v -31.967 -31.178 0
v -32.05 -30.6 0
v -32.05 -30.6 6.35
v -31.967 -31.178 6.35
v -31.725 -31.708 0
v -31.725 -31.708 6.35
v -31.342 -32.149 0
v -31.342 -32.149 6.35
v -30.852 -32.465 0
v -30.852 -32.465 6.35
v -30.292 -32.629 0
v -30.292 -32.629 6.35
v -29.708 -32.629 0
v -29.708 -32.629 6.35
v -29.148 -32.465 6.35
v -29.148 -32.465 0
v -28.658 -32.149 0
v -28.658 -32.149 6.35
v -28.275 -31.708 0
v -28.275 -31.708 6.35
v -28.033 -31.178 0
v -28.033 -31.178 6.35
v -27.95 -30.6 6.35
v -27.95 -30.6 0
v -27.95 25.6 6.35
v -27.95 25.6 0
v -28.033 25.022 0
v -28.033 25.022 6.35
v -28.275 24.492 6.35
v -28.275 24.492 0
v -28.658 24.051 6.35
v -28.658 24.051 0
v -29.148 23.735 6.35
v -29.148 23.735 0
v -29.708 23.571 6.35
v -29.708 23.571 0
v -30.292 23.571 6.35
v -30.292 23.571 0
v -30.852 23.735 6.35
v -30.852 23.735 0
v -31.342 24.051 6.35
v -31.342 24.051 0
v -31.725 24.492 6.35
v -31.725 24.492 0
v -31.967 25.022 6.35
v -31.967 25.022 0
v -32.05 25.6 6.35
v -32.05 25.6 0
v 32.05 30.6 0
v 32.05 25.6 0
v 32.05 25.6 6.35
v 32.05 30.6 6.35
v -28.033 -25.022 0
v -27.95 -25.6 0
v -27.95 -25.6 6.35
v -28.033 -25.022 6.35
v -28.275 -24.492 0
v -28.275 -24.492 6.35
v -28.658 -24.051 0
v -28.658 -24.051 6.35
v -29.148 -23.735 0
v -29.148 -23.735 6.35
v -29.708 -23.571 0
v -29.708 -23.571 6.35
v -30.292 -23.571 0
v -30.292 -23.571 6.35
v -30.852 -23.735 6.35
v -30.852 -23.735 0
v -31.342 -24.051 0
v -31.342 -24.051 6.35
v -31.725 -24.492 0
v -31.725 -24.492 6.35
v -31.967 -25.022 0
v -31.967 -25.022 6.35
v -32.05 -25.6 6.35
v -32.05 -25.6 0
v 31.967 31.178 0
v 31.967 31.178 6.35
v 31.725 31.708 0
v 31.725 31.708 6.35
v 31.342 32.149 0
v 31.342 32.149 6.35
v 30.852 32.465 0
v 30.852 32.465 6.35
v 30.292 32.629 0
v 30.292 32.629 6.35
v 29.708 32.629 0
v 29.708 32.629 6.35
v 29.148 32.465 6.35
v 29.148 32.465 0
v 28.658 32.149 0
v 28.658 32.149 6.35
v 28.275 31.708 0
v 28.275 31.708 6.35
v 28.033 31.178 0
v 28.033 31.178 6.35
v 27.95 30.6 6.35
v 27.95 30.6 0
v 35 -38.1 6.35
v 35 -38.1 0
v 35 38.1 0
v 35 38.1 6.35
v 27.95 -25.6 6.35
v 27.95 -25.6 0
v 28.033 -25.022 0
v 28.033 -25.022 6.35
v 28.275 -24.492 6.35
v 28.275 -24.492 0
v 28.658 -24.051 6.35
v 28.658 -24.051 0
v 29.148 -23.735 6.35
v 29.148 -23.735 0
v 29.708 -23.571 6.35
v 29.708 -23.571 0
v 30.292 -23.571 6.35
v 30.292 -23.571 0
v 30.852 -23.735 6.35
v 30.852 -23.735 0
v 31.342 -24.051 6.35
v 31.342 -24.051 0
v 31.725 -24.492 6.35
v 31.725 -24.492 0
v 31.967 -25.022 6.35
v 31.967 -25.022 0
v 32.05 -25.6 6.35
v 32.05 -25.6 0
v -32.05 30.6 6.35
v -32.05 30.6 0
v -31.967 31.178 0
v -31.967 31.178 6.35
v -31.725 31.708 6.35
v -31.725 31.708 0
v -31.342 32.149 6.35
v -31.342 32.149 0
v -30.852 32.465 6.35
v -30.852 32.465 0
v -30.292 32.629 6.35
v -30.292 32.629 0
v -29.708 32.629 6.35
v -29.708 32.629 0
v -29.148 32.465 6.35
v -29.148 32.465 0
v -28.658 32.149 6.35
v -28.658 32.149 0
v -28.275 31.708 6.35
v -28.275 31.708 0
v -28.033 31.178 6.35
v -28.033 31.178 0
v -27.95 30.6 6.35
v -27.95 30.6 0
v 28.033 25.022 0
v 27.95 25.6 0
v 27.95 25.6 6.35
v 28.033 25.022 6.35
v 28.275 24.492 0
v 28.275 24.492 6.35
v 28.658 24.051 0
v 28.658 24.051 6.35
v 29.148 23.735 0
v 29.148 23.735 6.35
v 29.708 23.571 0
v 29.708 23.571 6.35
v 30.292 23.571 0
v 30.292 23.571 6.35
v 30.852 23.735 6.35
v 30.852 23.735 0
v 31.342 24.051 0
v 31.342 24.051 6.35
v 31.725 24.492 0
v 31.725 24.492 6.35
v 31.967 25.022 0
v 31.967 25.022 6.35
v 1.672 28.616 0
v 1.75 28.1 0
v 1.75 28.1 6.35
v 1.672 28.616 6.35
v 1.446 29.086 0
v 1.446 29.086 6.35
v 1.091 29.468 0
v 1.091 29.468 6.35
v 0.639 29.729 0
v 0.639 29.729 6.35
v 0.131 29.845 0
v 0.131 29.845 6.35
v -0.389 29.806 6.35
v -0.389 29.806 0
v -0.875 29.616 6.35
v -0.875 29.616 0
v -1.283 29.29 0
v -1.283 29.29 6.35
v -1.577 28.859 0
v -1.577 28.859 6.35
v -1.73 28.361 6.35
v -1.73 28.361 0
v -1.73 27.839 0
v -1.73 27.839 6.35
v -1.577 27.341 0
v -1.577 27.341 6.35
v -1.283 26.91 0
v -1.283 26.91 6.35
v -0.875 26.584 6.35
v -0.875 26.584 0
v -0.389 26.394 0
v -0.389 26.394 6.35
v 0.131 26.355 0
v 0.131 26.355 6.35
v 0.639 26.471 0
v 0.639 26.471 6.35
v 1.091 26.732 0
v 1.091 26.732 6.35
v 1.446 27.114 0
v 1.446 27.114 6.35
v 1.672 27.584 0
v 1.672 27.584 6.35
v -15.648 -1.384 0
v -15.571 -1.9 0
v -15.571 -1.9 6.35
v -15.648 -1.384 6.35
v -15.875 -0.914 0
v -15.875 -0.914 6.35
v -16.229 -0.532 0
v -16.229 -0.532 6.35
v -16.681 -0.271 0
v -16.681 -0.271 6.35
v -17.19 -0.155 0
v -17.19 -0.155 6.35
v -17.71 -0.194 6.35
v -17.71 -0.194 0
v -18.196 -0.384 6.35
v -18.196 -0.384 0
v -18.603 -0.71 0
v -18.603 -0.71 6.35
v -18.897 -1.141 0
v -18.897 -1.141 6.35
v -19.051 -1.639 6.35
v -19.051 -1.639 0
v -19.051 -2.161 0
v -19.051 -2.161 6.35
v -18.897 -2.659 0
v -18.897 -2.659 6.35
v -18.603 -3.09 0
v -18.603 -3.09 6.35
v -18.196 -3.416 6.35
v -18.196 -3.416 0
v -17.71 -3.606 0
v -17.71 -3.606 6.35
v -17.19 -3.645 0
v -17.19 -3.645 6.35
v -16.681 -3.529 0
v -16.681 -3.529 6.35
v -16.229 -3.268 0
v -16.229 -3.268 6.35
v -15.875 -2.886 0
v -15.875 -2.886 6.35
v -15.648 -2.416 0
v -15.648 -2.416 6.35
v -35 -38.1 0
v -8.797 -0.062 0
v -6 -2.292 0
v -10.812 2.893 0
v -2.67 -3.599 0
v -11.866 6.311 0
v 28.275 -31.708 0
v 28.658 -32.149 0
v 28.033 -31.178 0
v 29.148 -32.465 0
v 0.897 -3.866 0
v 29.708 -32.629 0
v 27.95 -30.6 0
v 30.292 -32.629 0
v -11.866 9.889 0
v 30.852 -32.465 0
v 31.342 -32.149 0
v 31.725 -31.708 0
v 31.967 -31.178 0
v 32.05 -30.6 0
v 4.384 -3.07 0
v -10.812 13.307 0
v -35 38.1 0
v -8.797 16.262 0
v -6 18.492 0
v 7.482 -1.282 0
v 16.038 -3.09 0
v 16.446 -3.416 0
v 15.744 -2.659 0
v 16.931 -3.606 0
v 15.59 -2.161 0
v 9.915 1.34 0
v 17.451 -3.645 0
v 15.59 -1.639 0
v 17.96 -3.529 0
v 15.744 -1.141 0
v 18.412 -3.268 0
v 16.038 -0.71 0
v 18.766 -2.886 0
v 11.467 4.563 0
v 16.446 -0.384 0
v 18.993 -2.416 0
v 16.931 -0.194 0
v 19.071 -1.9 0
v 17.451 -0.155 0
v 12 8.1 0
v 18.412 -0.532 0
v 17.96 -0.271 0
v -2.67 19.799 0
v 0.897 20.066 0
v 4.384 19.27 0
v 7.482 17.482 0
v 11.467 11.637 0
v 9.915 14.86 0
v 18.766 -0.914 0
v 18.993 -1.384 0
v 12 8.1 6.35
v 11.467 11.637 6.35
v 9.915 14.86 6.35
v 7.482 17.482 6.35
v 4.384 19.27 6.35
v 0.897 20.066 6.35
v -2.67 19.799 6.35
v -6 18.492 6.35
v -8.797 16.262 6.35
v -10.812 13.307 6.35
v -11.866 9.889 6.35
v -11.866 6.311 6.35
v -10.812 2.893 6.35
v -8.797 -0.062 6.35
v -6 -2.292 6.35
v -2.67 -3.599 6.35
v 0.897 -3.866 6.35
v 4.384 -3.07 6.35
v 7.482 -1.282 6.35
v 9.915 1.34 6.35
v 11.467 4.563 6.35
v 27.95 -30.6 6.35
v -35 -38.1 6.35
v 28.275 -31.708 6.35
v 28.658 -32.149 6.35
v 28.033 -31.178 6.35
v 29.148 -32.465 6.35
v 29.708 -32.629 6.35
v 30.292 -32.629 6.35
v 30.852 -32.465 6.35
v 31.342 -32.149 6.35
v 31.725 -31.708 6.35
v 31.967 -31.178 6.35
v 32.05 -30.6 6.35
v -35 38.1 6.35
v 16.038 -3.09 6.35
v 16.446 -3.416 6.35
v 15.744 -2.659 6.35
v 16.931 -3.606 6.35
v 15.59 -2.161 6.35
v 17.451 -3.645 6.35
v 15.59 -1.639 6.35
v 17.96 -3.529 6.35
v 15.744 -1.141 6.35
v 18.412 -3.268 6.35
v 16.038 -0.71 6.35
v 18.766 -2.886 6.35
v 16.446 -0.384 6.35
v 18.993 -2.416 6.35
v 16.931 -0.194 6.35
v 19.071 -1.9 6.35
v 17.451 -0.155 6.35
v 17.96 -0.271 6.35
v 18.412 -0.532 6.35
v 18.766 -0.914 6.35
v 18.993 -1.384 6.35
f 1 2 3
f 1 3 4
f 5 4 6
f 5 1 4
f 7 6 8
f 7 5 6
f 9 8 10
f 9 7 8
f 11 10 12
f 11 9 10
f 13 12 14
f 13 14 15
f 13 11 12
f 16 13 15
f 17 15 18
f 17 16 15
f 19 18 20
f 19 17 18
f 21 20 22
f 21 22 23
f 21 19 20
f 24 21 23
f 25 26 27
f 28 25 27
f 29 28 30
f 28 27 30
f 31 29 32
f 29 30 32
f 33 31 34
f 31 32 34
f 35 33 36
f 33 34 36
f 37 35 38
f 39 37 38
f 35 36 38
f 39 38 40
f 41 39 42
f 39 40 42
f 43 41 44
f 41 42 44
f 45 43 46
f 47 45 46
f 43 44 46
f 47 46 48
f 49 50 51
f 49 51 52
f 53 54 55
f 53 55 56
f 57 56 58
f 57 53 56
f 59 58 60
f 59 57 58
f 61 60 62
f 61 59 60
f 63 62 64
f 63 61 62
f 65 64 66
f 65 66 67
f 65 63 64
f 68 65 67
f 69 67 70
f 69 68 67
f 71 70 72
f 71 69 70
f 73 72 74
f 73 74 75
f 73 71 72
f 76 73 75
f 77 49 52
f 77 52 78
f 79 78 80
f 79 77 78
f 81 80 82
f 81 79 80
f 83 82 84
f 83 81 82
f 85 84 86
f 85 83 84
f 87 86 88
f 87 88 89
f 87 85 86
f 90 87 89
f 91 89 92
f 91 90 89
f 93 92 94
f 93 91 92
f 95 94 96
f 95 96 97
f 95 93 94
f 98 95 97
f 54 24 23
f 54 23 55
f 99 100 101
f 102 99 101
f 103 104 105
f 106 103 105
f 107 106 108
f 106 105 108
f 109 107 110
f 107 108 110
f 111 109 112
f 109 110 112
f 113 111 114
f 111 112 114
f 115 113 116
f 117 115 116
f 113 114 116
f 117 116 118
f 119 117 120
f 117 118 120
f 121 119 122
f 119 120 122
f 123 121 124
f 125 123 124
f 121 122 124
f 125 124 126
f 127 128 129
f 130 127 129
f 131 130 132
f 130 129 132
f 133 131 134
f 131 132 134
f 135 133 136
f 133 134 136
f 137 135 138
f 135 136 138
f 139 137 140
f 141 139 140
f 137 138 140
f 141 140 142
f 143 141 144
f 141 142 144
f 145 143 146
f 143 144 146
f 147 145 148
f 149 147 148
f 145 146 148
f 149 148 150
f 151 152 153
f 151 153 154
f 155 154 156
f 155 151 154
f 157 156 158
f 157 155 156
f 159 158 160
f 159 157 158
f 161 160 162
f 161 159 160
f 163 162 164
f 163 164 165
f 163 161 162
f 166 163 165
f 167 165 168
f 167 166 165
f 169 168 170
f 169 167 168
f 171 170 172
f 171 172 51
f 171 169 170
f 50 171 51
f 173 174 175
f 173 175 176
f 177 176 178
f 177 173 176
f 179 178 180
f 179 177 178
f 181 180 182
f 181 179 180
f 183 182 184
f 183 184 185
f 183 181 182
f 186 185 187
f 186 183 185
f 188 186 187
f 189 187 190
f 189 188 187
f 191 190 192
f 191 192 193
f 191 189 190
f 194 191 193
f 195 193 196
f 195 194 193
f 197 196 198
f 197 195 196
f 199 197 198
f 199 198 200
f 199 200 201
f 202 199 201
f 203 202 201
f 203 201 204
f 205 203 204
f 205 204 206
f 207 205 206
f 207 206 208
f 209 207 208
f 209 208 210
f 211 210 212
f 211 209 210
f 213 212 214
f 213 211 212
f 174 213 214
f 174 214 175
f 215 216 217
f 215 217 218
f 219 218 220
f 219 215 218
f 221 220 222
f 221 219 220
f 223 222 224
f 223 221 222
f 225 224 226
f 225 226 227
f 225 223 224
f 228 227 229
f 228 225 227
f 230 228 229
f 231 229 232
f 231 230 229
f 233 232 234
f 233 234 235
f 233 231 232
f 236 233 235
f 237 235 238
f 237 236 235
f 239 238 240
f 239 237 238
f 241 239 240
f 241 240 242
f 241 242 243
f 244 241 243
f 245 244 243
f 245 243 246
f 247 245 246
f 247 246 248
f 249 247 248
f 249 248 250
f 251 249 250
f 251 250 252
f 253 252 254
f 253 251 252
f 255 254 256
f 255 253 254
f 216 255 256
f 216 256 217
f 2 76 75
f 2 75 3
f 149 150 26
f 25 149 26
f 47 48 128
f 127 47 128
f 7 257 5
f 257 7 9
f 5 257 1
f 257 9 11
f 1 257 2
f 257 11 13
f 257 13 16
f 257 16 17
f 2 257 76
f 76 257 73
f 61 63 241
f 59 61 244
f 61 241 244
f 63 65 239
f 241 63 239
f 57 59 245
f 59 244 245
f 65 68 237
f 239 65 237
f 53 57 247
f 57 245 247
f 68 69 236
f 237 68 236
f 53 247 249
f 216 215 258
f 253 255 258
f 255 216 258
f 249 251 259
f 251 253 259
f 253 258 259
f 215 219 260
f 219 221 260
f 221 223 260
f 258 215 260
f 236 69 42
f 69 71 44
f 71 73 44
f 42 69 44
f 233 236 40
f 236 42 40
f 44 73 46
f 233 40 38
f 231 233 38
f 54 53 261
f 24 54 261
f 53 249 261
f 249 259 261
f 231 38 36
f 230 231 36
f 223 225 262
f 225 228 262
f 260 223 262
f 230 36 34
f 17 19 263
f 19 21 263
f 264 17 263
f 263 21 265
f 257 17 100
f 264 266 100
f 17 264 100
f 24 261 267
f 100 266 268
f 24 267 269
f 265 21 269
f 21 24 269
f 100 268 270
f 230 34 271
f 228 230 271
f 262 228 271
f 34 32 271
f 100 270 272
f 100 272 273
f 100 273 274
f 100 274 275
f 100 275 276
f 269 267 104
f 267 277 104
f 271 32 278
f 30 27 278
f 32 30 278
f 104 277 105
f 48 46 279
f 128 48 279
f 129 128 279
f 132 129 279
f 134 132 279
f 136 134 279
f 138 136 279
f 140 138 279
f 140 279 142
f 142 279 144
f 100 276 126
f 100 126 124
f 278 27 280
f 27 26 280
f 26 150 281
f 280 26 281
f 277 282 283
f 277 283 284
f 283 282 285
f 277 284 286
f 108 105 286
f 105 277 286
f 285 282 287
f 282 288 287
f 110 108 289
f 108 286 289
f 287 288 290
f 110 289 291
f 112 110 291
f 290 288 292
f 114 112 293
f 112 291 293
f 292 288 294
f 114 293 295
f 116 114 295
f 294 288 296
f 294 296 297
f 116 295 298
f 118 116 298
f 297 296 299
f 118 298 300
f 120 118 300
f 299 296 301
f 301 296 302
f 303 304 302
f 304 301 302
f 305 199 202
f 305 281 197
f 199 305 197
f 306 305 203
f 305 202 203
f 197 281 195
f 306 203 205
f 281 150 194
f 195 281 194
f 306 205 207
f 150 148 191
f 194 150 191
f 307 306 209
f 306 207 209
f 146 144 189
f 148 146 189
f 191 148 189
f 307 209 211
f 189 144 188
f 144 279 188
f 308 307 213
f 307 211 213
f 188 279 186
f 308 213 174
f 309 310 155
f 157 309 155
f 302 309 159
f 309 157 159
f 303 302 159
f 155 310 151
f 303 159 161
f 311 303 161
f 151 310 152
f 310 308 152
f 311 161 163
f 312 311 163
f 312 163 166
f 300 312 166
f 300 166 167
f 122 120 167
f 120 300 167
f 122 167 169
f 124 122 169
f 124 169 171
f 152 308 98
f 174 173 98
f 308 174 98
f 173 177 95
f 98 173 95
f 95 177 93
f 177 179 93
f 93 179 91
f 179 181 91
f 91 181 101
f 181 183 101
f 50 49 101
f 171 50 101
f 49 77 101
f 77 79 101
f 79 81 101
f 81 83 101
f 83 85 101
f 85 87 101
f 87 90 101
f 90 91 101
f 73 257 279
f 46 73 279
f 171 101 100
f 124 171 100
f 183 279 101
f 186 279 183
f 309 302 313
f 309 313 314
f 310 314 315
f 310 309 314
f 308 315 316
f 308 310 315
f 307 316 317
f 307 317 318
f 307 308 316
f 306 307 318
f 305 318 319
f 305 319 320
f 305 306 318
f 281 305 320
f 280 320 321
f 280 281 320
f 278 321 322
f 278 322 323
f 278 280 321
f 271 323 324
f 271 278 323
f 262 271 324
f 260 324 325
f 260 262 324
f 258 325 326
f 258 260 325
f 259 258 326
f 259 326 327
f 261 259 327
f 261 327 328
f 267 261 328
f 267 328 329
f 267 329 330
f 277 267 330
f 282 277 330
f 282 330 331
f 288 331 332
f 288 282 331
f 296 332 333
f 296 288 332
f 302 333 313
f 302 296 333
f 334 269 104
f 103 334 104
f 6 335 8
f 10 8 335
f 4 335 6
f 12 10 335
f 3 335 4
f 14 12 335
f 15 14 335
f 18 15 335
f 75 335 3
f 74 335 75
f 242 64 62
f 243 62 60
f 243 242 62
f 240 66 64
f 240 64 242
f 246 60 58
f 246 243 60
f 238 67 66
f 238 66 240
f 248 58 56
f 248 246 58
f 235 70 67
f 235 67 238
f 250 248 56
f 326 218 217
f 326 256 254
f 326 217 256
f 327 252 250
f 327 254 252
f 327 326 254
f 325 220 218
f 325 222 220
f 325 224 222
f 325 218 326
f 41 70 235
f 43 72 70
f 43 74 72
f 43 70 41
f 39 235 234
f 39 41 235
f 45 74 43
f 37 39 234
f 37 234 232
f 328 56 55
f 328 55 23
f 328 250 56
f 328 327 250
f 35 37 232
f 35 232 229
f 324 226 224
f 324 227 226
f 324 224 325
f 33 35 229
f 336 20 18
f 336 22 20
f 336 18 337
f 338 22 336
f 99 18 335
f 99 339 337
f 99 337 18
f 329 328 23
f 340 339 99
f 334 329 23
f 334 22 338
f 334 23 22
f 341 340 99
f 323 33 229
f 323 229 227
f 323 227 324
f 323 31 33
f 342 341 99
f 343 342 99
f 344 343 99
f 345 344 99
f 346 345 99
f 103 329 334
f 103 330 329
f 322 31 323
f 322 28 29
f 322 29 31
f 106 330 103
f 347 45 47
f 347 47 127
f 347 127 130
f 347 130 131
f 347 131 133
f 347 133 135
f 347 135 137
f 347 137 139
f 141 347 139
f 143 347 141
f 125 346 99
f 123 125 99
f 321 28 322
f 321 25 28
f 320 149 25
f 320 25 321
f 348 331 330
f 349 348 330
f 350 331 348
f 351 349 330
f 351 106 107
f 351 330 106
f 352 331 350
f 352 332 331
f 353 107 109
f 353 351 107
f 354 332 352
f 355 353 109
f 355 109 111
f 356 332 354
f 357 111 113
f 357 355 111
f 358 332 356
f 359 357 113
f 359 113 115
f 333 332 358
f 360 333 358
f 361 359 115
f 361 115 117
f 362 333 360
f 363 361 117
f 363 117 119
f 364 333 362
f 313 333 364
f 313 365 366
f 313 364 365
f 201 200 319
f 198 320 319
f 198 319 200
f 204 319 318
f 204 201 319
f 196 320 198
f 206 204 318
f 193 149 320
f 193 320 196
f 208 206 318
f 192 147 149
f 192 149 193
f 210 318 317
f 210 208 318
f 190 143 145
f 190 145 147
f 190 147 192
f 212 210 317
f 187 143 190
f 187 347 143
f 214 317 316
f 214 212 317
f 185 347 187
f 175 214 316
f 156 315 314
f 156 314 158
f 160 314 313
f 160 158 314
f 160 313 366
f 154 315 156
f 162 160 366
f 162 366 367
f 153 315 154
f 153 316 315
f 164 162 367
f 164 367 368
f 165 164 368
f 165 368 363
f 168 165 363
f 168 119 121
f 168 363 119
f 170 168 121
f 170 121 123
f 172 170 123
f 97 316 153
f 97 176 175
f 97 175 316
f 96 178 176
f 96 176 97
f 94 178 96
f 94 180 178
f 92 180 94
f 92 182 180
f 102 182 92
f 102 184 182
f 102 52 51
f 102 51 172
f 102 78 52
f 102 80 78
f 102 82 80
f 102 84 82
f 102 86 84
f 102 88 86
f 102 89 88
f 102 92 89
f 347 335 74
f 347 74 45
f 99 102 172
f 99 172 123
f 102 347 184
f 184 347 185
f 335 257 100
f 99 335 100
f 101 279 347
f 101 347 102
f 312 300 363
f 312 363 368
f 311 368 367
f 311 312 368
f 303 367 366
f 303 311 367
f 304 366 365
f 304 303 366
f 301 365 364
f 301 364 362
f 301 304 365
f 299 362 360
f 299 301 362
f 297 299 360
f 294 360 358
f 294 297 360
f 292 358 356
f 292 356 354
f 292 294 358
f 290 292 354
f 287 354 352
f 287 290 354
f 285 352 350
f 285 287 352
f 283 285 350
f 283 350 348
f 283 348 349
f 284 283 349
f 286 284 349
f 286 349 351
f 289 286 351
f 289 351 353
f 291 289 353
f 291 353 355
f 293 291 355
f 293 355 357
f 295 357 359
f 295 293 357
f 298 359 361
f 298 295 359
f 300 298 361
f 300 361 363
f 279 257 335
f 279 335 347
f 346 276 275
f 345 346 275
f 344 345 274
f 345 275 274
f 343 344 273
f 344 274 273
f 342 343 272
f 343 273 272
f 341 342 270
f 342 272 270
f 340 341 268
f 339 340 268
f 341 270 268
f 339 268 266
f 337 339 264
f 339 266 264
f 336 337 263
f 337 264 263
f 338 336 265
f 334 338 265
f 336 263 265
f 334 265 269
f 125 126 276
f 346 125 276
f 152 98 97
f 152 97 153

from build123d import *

# Parameters (mm, degrees)
SKETCH1_W           = 70
SKETCH1_H           = 76.2
SKETCH1_R           = 1.75
SKETCH1_R_2         = 12
BOSS_EXTRUDE1_DEPTH = 6.35


with BuildPart() as part:
    # Sketch1 → Boss-Extrude1 (new body)
    with BuildSketch(Plane.XY):
        Rectangle(SKETCH1_W, SKETCH1_H)
        with Locations((0, 28.1)):
            Circle(SKETCH1_R, mode=Mode.SUBTRACT)
        with Locations((17.320508076, -1.9)):
            Circle(SKETCH1_R, mode=Mode.SUBTRACT)
        with Locations((-17.320508076, -1.9)):
            Circle(SKETCH1_R, mode=Mode.SUBTRACT)
        with Locations((0, 8.1)):
            Circle(SKETCH1_R_2, mode=Mode.SUBTRACT)
        with BuildLine():
            Line((-32.05, 25.6), (-32.05, 30.6))
            ThreePointArc((-32.05, 30.6), (-30, 32.65), (-27.95, 30.6))
            Line((-27.95, 30.6), (-27.95, 25.6))
            ThreePointArc((-27.95, 25.6), (-30, 23.55), (-32.05, 25.6))
        make_face(mode=Mode.SUBTRACT)
        with BuildLine():
            Line((32.05, 25.6), (32.05, 30.6))
            ThreePointArc((32.05, 30.6), (30, 32.65), (27.95, 30.6))
            Line((27.95, 30.6), (27.95, 25.6))
            ThreePointArc((27.95, 25.6), (30, 23.55), (32.05, 25.6))
        make_face(mode=Mode.SUBTRACT)
        with BuildLine():
            Line((-32.05, -25.6), (-32.05, -30.6))
            ThreePointArc((-32.05, -30.6), (-30, -32.65), (-27.95, -30.6))
            Line((-27.95, -30.6), (-27.95, -25.6))
            ThreePointArc((-27.95, -25.6), (-30, -23.55), (-32.05, -25.6))
        make_face(mode=Mode.SUBTRACT)
        with BuildLine():
            Line((32.05, -25.6), (32.05, -30.6))
            ThreePointArc((32.05, -30.6), (30, -32.65), (27.95, -30.6))
            Line((27.95, -30.6), (27.95, -25.6))
            ThreePointArc((27.95, -25.6), (30, -23.55), (32.05, -25.6))
        make_face(mode=Mode.SUBTRACT)
    extrude(amount=BOSS_EXTRUDE1_DEPTH)


solid = part.part
